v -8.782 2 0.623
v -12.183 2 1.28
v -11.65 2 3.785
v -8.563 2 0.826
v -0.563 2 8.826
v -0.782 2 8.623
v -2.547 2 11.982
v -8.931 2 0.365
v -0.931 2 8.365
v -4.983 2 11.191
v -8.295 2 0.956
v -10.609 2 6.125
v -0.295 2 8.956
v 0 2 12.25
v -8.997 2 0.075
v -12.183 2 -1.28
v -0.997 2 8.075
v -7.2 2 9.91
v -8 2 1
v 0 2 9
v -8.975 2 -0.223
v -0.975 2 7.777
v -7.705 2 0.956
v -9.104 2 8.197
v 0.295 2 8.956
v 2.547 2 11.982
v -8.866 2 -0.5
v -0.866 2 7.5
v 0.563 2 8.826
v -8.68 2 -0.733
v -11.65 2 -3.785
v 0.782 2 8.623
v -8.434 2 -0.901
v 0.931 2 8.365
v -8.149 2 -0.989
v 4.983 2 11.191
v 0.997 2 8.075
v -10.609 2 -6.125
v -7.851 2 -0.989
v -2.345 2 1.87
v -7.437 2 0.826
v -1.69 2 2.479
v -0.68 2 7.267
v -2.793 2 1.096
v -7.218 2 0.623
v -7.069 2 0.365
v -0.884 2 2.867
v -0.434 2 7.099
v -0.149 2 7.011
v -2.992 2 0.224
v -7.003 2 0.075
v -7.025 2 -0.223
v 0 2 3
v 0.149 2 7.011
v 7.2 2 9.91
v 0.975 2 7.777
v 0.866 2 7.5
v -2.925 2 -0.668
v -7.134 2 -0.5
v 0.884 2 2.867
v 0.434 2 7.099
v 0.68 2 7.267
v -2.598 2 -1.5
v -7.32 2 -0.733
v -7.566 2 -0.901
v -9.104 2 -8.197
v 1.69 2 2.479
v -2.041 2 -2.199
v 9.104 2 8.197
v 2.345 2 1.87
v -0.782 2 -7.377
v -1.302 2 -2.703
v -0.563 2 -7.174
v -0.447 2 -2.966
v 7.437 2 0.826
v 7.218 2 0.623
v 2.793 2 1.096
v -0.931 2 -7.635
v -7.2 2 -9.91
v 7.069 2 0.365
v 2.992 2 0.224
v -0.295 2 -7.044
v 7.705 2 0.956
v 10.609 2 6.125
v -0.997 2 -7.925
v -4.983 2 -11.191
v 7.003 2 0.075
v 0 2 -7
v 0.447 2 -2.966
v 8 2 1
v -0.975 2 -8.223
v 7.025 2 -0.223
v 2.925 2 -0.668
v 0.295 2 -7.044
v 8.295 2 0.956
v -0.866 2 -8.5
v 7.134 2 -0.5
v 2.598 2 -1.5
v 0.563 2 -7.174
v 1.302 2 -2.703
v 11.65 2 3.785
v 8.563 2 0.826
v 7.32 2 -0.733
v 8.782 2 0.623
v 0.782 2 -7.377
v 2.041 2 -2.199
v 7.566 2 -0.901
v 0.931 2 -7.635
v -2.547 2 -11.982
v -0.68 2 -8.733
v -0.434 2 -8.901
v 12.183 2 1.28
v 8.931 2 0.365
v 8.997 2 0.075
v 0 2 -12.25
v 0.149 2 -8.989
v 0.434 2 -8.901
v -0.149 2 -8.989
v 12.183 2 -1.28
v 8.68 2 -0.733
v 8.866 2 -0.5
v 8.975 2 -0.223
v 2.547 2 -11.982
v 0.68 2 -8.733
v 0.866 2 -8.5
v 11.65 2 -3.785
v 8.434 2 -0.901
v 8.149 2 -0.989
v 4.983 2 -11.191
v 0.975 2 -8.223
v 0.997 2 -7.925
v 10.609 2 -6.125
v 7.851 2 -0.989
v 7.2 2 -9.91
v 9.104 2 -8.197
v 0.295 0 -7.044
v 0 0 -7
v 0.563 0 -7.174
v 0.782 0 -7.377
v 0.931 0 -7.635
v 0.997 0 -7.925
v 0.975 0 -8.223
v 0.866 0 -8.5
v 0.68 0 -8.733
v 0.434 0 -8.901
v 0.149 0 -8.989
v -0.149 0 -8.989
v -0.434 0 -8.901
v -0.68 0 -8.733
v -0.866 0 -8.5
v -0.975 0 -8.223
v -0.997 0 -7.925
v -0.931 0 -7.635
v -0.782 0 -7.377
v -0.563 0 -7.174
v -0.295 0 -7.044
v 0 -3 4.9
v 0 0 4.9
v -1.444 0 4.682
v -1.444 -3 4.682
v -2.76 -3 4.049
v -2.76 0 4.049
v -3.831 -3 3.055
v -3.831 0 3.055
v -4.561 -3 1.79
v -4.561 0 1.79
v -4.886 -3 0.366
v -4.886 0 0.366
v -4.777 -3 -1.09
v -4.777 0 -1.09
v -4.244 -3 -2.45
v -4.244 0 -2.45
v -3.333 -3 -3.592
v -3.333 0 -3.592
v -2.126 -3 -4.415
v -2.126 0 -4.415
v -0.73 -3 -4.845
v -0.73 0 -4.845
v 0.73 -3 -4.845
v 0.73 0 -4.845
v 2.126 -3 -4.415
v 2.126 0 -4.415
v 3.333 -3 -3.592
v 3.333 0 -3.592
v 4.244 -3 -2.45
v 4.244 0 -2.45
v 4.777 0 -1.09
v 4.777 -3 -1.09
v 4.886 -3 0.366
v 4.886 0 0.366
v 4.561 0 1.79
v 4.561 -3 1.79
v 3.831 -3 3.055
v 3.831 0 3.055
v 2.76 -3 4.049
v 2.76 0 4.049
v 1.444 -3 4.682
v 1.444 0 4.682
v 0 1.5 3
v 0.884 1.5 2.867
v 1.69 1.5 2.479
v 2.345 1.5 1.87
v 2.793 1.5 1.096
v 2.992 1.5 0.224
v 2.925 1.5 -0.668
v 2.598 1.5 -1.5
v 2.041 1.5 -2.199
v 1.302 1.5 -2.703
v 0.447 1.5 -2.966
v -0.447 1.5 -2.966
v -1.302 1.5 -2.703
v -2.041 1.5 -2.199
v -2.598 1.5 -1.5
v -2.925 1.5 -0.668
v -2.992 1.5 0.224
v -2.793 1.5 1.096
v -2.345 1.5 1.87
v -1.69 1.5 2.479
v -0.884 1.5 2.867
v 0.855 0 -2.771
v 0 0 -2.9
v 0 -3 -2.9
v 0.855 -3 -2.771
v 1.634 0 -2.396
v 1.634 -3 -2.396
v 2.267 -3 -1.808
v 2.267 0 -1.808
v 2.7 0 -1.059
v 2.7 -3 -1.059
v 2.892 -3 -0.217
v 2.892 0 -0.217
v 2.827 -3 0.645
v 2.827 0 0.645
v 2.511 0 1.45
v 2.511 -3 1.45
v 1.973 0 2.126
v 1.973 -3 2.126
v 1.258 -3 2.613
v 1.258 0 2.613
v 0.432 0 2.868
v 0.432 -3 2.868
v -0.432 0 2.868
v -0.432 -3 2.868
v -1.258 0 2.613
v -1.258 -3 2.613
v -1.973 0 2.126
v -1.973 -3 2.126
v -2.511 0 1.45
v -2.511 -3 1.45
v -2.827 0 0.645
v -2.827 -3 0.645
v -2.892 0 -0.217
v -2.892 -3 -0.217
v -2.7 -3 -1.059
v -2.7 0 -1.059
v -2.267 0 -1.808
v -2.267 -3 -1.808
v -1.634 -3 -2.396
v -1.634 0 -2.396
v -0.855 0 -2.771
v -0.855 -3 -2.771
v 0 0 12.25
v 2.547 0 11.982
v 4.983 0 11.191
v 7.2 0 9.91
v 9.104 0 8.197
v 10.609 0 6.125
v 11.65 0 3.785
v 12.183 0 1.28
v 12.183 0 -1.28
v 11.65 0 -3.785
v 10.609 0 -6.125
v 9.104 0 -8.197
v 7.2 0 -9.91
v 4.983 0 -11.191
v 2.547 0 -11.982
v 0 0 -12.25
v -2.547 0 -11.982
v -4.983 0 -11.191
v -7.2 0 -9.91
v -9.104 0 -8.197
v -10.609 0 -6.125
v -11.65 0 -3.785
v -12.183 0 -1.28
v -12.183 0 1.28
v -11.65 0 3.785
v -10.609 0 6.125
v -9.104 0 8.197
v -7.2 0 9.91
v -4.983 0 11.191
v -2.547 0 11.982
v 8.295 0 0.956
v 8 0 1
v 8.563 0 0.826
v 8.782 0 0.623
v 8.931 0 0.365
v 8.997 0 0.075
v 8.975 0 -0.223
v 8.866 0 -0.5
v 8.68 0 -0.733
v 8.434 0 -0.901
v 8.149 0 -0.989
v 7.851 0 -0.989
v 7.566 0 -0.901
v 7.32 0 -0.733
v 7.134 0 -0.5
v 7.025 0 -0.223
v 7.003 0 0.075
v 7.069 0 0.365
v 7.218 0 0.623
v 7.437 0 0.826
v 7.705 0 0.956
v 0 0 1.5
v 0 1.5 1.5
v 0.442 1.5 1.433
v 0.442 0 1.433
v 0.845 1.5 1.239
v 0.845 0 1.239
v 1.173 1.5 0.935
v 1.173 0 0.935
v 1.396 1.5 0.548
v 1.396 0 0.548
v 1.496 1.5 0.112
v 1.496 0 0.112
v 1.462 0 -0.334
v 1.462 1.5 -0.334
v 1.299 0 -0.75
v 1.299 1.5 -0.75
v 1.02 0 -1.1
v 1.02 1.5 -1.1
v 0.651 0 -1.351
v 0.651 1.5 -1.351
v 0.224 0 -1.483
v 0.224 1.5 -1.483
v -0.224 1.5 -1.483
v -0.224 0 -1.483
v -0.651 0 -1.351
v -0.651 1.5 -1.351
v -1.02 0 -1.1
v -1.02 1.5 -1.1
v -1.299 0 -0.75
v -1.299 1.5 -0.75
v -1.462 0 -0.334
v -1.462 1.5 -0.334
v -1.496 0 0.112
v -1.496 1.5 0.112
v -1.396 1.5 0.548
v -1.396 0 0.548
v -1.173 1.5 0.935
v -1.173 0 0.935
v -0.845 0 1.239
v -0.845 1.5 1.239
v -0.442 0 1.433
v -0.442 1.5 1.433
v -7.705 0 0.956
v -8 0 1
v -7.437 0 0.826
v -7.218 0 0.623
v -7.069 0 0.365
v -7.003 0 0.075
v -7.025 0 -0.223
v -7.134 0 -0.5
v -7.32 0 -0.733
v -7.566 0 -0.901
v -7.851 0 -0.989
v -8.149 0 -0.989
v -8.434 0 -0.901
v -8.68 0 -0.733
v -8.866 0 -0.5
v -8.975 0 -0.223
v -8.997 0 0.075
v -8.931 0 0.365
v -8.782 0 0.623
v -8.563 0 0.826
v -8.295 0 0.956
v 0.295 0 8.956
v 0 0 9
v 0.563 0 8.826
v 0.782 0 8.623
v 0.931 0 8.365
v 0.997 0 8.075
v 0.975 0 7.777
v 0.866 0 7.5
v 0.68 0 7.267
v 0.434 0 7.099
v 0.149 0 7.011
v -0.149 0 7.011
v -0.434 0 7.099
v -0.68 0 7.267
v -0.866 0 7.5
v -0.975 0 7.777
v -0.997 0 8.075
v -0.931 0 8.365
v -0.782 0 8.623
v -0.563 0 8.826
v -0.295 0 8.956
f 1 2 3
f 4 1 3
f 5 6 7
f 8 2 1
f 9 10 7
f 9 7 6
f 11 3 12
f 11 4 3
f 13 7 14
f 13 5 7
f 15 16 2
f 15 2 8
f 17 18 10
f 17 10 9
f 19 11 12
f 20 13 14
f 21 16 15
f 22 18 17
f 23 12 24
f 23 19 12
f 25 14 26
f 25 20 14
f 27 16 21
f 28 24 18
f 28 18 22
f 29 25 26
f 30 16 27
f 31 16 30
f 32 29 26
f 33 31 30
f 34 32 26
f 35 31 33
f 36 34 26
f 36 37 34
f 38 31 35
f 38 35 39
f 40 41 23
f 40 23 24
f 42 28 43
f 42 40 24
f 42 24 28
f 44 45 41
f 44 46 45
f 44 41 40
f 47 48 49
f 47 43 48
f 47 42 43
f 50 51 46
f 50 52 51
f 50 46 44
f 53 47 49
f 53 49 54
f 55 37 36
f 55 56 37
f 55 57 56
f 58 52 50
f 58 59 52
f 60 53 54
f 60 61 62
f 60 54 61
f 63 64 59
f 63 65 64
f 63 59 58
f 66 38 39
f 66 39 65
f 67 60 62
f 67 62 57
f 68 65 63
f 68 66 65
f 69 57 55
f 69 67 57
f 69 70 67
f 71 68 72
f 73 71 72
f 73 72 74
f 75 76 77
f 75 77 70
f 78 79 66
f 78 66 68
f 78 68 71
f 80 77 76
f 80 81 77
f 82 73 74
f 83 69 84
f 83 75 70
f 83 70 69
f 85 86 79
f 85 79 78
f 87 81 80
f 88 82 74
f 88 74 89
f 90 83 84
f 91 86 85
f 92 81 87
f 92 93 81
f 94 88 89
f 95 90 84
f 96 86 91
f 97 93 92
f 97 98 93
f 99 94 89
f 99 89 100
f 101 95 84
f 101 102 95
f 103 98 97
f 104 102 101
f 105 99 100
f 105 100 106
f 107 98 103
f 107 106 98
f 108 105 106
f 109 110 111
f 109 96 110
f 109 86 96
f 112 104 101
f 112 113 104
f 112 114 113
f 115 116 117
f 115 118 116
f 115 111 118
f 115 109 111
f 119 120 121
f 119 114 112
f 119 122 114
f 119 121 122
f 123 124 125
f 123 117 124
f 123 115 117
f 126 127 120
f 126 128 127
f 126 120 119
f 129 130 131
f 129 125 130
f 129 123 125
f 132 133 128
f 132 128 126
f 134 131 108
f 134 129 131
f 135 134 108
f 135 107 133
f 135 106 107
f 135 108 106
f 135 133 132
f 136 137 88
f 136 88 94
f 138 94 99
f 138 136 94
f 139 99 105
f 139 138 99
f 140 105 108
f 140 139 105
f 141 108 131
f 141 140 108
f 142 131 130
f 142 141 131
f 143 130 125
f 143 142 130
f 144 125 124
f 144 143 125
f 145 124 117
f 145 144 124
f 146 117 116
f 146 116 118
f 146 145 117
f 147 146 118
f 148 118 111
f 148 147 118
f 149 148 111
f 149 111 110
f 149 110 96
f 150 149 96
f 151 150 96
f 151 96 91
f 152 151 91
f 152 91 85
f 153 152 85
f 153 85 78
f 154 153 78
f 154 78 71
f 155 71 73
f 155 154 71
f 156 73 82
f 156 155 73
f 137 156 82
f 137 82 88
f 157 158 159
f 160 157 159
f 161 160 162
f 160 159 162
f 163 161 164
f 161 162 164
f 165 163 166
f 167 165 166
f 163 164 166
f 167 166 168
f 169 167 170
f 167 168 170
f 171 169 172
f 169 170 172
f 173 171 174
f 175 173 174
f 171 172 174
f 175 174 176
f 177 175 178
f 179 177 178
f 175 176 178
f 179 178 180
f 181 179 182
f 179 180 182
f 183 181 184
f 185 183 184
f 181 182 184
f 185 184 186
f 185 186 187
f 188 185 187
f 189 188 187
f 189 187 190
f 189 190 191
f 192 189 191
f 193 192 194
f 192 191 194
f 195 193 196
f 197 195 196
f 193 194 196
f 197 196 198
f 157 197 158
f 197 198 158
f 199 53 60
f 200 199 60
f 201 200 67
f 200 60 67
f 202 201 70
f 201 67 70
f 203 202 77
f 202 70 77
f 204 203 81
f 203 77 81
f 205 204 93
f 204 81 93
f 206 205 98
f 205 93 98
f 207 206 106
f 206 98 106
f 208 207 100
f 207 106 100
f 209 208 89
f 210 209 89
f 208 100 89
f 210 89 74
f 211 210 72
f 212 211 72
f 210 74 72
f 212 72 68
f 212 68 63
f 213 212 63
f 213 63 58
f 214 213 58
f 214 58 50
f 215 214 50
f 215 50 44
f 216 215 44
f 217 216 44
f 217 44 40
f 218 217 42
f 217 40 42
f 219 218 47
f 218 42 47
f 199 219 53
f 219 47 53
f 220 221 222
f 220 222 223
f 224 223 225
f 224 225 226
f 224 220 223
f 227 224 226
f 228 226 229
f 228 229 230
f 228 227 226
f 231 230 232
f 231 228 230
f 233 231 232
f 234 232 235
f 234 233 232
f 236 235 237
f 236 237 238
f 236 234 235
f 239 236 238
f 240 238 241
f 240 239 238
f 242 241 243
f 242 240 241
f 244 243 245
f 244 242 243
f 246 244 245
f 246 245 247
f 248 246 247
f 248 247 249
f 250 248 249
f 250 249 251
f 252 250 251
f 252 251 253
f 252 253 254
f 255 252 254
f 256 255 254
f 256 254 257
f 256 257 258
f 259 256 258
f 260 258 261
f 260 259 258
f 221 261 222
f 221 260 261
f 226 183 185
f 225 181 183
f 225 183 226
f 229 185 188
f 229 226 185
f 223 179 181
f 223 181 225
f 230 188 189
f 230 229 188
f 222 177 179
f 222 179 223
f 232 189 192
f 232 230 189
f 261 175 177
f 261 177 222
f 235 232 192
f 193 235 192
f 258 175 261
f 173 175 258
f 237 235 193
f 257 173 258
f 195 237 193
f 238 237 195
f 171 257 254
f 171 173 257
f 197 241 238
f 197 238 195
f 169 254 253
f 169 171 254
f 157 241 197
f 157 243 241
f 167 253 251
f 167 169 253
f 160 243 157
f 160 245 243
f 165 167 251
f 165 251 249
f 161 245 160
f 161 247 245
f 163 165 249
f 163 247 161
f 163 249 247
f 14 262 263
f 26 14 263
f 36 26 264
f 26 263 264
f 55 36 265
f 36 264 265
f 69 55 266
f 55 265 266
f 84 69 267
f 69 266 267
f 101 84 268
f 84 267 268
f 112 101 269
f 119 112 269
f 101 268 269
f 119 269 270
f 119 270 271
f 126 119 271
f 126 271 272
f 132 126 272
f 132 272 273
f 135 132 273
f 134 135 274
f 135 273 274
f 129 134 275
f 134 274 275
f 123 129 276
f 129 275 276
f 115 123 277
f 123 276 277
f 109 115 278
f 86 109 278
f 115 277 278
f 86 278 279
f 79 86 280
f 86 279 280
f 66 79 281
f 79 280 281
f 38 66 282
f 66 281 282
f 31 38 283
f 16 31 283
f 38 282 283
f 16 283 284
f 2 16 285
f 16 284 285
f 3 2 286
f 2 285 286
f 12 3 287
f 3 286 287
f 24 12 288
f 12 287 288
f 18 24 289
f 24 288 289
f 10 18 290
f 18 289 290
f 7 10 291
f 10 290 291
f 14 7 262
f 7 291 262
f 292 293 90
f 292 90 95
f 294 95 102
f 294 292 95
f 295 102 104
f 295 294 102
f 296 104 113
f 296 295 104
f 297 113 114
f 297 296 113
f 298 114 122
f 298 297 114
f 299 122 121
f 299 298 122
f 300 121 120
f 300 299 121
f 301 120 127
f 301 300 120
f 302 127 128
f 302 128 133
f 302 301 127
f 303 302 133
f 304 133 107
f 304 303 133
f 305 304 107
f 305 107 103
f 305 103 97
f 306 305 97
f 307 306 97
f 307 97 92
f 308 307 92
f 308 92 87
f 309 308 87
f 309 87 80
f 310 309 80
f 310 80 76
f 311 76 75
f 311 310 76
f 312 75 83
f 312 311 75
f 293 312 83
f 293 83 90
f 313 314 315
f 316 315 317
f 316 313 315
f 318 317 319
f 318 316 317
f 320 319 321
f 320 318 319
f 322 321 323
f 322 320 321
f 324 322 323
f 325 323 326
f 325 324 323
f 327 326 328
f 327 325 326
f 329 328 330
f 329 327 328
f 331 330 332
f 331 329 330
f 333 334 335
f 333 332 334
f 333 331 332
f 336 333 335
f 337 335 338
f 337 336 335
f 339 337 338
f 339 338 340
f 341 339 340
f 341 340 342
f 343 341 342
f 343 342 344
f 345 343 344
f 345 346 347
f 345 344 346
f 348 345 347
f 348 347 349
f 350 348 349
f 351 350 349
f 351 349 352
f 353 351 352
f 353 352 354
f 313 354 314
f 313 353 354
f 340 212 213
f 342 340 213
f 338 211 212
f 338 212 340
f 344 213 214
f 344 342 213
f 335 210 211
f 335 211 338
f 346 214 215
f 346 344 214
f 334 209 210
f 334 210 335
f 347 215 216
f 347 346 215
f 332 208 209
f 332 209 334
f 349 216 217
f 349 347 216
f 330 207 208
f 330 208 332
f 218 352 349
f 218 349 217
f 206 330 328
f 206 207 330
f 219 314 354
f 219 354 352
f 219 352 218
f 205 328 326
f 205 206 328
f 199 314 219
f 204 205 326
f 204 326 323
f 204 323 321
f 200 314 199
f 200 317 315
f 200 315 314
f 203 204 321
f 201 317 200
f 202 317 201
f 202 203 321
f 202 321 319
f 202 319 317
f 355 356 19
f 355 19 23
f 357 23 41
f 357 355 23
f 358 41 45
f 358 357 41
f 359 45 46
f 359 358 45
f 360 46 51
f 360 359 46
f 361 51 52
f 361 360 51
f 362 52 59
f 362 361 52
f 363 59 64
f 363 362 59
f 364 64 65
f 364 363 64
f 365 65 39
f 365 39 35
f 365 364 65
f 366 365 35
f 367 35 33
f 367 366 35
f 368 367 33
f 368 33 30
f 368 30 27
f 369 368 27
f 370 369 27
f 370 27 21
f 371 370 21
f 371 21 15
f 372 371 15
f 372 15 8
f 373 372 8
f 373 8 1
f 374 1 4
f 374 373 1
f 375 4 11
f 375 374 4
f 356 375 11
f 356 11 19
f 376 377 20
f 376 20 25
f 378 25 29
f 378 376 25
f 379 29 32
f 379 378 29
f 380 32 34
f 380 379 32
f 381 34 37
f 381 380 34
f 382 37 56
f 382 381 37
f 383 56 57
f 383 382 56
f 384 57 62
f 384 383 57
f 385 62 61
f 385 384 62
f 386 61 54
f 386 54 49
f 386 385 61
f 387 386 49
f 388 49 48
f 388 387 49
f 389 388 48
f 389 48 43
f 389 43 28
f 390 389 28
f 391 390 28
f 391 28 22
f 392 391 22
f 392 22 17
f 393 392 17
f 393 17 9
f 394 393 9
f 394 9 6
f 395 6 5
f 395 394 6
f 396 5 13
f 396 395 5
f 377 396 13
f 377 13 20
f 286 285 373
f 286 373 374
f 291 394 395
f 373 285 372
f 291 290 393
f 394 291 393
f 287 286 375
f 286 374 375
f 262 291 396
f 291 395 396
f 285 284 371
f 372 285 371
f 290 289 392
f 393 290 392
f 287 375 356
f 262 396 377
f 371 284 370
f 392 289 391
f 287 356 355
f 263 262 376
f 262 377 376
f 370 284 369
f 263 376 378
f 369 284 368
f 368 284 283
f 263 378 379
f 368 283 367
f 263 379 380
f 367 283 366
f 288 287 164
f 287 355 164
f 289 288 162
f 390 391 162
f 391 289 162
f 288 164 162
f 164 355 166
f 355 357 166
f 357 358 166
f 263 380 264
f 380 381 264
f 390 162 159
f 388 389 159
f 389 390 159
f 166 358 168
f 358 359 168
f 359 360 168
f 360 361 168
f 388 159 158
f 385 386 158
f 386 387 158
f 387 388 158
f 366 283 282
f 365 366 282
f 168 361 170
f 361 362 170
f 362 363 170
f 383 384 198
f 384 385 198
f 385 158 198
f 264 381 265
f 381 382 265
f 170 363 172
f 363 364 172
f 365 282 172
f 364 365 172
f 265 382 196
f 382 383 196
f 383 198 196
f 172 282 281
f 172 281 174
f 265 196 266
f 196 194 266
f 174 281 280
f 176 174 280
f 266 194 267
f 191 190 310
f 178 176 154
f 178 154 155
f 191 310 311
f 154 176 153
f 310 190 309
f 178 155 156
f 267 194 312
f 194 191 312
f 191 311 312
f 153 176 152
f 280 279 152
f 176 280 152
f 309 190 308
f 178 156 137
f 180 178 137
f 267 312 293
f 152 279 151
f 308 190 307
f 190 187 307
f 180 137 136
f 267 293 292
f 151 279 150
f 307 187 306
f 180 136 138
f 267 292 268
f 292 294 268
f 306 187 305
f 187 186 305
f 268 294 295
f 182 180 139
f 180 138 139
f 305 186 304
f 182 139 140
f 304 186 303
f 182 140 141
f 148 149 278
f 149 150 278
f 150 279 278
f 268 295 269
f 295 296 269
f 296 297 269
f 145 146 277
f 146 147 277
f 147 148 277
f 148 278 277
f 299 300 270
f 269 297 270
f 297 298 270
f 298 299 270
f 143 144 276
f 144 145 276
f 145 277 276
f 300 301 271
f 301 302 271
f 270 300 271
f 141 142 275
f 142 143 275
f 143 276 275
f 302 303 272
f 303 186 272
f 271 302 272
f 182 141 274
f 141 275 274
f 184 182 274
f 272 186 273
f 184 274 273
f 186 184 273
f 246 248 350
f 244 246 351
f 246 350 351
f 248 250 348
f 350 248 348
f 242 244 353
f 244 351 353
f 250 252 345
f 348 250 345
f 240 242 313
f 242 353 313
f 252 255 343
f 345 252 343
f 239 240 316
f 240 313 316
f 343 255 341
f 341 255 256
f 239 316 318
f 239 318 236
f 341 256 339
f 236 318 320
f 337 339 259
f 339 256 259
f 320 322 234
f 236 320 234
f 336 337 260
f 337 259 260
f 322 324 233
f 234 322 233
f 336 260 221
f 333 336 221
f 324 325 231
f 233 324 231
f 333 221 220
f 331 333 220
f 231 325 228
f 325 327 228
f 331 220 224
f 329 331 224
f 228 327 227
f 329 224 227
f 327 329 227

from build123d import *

# Parameters (mm, degrees)
SKETCH_1_R          = 12.25
SKETCH_1_R_2        = 3
SKETCH_1_R_3        = 1
SKETCH_1_R_4        = 2.9
SKETCH_1_R_5        = 1.5
EXTRUDE_1_DEPTH     = 2
SKETCH_2_R          = 4.9
SKETCH_2_R_2        = 2.9
EXTRUDE_2_DEPTH     = 3
CUT_EXTRUDE_START   = 2
SKETCH_1_4_R        = 3
CUT_EXTRUDE_1_DEPTH = 0.5


with BuildPart() as part:
    # 草图1 → 凸台-拉伸1 (new body)
    # profile 1 of 3: a face of its own
    with BuildSketch(Plane(origin=(0, 0, 0), x_dir=(1, 0, 0), z_dir=(0, 1, 0))):
        with Locations(Location((0, 0, 0), (0, 0, 270))):
            Circle(SKETCH_1_R)
        Circle(SKETCH_1_R_2, mode=Mode.SUBTRACT)
        with Locations(Location((-8, 0, 0), (0, 0, 270))):
            Circle(SKETCH_1_R_3, mode=Mode.SUBTRACT)
        with Locations(Location((0, -8, 0), (0, 0, 270))):
            Circle(SKETCH_1_R_3, mode=Mode.SUBTRACT)
        with Locations(Location((8, 0, 0), (0, 0, 270))):
            Circle(SKETCH_1_R_3, mode=Mode.SUBTRACT)
        with Locations(Location((0, 8, 0), (0, 0, 270))):
            Circle(SKETCH_1_R_3, mode=Mode.SUBTRACT)
    # profile 2 of 3: a face of its own
    with BuildSketch(Plane(origin=(0, 0, 0), x_dir=(1, 0, 0), z_dir=(0, 1, 0))):
        Circle(SKETCH_1_R_2)
        Circle(SKETCH_1_R_4, mode=Mode.SUBTRACT)
    # profile 3 of 3: a face of its own
    with BuildSketch(Plane(origin=(0, 0, 0), x_dir=(1, 0, 0), z_dir=(0, 1, 0))):
        Circle(SKETCH_1_R_4)
        with Locations(Location((0, 0, 0), (0, 0, 270))):
            Circle(SKETCH_1_R_5, mode=Mode.SUBTRACT)
    extrude(amount=EXTRUDE_1_DEPTH)

    # 草图2 → 凸台-拉伸2 (add)
    with BuildSketch(Plane.XZ):
        with Locations(Location((0, 0, 0), (0, 0, 90))):
            Circle(SKETCH_2_R)
        with Locations(Location((0, 0, 0), (0, 0, 270))):
            Circle(SKETCH_2_R_2, mode=Mode.SUBTRACT)
    extrude(amount=EXTRUDE_2_DEPTH)

    # 草图1<4> → 切除-拉伸1 (cut)
    with BuildSketch(Plane(origin=(0, 0, 0), x_dir=(1, 0, 0), z_dir=(0, 1, 0)).offset(CUT_EXTRUDE_START)):
        with Locations(Location((0, 0, 0), (0, 0, 270))):
            Circle(SKETCH_1_4_R)
    extrude(amount=-CUT_EXTRUDE_1_DEPTH, mode=Mode.SUBTRACT)


solid = part.part
